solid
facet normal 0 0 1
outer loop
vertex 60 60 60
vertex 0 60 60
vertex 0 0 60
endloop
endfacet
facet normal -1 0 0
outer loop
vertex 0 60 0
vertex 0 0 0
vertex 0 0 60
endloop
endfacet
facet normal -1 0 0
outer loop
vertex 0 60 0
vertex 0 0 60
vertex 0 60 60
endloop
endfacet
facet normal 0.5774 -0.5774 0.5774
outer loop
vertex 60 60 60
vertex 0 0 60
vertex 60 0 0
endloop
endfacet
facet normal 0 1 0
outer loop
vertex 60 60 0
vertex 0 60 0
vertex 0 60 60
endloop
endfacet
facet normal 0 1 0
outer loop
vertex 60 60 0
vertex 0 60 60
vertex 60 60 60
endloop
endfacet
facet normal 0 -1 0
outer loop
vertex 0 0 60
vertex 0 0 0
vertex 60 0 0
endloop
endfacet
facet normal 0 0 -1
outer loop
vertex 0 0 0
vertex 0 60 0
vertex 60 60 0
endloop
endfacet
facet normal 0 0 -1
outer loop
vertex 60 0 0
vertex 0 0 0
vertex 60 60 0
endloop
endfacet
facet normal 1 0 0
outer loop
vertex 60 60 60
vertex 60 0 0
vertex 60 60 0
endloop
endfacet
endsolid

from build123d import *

# Parameters (mm, degrees)
F0_W     = 60
F0_H     = 60
F1_DEPTH = 60
F4_DEPTH = 34.6420161514


with BuildPart() as f1:
    # F0 (on Top) → F1 (new body)
    with BuildSketch(Plane.XY):
        with Locations((30, 30)):
            Rectangle(F0_W, F0_H)
    extrude(amount=F1_DEPTH)

    # F3 (on 3pt) → F4 (cut, through all)
    with BuildSketch(Plane(origin=(20, -20, 20), x_dir=(0.8164965809, 0.4082482905, -0.4082482905), z_dir=(0.5773502692, -0.5773502692, 0.5773502692))):
        Polygon((48.9897948557, 84.8528137424), (-24.4948974278, 42.4264068712), (48.9897948557, 0), align=None)
    extrude(amount=F4_DEPTH, mode=Mode.SUBTRACT)


solid = f1.part
